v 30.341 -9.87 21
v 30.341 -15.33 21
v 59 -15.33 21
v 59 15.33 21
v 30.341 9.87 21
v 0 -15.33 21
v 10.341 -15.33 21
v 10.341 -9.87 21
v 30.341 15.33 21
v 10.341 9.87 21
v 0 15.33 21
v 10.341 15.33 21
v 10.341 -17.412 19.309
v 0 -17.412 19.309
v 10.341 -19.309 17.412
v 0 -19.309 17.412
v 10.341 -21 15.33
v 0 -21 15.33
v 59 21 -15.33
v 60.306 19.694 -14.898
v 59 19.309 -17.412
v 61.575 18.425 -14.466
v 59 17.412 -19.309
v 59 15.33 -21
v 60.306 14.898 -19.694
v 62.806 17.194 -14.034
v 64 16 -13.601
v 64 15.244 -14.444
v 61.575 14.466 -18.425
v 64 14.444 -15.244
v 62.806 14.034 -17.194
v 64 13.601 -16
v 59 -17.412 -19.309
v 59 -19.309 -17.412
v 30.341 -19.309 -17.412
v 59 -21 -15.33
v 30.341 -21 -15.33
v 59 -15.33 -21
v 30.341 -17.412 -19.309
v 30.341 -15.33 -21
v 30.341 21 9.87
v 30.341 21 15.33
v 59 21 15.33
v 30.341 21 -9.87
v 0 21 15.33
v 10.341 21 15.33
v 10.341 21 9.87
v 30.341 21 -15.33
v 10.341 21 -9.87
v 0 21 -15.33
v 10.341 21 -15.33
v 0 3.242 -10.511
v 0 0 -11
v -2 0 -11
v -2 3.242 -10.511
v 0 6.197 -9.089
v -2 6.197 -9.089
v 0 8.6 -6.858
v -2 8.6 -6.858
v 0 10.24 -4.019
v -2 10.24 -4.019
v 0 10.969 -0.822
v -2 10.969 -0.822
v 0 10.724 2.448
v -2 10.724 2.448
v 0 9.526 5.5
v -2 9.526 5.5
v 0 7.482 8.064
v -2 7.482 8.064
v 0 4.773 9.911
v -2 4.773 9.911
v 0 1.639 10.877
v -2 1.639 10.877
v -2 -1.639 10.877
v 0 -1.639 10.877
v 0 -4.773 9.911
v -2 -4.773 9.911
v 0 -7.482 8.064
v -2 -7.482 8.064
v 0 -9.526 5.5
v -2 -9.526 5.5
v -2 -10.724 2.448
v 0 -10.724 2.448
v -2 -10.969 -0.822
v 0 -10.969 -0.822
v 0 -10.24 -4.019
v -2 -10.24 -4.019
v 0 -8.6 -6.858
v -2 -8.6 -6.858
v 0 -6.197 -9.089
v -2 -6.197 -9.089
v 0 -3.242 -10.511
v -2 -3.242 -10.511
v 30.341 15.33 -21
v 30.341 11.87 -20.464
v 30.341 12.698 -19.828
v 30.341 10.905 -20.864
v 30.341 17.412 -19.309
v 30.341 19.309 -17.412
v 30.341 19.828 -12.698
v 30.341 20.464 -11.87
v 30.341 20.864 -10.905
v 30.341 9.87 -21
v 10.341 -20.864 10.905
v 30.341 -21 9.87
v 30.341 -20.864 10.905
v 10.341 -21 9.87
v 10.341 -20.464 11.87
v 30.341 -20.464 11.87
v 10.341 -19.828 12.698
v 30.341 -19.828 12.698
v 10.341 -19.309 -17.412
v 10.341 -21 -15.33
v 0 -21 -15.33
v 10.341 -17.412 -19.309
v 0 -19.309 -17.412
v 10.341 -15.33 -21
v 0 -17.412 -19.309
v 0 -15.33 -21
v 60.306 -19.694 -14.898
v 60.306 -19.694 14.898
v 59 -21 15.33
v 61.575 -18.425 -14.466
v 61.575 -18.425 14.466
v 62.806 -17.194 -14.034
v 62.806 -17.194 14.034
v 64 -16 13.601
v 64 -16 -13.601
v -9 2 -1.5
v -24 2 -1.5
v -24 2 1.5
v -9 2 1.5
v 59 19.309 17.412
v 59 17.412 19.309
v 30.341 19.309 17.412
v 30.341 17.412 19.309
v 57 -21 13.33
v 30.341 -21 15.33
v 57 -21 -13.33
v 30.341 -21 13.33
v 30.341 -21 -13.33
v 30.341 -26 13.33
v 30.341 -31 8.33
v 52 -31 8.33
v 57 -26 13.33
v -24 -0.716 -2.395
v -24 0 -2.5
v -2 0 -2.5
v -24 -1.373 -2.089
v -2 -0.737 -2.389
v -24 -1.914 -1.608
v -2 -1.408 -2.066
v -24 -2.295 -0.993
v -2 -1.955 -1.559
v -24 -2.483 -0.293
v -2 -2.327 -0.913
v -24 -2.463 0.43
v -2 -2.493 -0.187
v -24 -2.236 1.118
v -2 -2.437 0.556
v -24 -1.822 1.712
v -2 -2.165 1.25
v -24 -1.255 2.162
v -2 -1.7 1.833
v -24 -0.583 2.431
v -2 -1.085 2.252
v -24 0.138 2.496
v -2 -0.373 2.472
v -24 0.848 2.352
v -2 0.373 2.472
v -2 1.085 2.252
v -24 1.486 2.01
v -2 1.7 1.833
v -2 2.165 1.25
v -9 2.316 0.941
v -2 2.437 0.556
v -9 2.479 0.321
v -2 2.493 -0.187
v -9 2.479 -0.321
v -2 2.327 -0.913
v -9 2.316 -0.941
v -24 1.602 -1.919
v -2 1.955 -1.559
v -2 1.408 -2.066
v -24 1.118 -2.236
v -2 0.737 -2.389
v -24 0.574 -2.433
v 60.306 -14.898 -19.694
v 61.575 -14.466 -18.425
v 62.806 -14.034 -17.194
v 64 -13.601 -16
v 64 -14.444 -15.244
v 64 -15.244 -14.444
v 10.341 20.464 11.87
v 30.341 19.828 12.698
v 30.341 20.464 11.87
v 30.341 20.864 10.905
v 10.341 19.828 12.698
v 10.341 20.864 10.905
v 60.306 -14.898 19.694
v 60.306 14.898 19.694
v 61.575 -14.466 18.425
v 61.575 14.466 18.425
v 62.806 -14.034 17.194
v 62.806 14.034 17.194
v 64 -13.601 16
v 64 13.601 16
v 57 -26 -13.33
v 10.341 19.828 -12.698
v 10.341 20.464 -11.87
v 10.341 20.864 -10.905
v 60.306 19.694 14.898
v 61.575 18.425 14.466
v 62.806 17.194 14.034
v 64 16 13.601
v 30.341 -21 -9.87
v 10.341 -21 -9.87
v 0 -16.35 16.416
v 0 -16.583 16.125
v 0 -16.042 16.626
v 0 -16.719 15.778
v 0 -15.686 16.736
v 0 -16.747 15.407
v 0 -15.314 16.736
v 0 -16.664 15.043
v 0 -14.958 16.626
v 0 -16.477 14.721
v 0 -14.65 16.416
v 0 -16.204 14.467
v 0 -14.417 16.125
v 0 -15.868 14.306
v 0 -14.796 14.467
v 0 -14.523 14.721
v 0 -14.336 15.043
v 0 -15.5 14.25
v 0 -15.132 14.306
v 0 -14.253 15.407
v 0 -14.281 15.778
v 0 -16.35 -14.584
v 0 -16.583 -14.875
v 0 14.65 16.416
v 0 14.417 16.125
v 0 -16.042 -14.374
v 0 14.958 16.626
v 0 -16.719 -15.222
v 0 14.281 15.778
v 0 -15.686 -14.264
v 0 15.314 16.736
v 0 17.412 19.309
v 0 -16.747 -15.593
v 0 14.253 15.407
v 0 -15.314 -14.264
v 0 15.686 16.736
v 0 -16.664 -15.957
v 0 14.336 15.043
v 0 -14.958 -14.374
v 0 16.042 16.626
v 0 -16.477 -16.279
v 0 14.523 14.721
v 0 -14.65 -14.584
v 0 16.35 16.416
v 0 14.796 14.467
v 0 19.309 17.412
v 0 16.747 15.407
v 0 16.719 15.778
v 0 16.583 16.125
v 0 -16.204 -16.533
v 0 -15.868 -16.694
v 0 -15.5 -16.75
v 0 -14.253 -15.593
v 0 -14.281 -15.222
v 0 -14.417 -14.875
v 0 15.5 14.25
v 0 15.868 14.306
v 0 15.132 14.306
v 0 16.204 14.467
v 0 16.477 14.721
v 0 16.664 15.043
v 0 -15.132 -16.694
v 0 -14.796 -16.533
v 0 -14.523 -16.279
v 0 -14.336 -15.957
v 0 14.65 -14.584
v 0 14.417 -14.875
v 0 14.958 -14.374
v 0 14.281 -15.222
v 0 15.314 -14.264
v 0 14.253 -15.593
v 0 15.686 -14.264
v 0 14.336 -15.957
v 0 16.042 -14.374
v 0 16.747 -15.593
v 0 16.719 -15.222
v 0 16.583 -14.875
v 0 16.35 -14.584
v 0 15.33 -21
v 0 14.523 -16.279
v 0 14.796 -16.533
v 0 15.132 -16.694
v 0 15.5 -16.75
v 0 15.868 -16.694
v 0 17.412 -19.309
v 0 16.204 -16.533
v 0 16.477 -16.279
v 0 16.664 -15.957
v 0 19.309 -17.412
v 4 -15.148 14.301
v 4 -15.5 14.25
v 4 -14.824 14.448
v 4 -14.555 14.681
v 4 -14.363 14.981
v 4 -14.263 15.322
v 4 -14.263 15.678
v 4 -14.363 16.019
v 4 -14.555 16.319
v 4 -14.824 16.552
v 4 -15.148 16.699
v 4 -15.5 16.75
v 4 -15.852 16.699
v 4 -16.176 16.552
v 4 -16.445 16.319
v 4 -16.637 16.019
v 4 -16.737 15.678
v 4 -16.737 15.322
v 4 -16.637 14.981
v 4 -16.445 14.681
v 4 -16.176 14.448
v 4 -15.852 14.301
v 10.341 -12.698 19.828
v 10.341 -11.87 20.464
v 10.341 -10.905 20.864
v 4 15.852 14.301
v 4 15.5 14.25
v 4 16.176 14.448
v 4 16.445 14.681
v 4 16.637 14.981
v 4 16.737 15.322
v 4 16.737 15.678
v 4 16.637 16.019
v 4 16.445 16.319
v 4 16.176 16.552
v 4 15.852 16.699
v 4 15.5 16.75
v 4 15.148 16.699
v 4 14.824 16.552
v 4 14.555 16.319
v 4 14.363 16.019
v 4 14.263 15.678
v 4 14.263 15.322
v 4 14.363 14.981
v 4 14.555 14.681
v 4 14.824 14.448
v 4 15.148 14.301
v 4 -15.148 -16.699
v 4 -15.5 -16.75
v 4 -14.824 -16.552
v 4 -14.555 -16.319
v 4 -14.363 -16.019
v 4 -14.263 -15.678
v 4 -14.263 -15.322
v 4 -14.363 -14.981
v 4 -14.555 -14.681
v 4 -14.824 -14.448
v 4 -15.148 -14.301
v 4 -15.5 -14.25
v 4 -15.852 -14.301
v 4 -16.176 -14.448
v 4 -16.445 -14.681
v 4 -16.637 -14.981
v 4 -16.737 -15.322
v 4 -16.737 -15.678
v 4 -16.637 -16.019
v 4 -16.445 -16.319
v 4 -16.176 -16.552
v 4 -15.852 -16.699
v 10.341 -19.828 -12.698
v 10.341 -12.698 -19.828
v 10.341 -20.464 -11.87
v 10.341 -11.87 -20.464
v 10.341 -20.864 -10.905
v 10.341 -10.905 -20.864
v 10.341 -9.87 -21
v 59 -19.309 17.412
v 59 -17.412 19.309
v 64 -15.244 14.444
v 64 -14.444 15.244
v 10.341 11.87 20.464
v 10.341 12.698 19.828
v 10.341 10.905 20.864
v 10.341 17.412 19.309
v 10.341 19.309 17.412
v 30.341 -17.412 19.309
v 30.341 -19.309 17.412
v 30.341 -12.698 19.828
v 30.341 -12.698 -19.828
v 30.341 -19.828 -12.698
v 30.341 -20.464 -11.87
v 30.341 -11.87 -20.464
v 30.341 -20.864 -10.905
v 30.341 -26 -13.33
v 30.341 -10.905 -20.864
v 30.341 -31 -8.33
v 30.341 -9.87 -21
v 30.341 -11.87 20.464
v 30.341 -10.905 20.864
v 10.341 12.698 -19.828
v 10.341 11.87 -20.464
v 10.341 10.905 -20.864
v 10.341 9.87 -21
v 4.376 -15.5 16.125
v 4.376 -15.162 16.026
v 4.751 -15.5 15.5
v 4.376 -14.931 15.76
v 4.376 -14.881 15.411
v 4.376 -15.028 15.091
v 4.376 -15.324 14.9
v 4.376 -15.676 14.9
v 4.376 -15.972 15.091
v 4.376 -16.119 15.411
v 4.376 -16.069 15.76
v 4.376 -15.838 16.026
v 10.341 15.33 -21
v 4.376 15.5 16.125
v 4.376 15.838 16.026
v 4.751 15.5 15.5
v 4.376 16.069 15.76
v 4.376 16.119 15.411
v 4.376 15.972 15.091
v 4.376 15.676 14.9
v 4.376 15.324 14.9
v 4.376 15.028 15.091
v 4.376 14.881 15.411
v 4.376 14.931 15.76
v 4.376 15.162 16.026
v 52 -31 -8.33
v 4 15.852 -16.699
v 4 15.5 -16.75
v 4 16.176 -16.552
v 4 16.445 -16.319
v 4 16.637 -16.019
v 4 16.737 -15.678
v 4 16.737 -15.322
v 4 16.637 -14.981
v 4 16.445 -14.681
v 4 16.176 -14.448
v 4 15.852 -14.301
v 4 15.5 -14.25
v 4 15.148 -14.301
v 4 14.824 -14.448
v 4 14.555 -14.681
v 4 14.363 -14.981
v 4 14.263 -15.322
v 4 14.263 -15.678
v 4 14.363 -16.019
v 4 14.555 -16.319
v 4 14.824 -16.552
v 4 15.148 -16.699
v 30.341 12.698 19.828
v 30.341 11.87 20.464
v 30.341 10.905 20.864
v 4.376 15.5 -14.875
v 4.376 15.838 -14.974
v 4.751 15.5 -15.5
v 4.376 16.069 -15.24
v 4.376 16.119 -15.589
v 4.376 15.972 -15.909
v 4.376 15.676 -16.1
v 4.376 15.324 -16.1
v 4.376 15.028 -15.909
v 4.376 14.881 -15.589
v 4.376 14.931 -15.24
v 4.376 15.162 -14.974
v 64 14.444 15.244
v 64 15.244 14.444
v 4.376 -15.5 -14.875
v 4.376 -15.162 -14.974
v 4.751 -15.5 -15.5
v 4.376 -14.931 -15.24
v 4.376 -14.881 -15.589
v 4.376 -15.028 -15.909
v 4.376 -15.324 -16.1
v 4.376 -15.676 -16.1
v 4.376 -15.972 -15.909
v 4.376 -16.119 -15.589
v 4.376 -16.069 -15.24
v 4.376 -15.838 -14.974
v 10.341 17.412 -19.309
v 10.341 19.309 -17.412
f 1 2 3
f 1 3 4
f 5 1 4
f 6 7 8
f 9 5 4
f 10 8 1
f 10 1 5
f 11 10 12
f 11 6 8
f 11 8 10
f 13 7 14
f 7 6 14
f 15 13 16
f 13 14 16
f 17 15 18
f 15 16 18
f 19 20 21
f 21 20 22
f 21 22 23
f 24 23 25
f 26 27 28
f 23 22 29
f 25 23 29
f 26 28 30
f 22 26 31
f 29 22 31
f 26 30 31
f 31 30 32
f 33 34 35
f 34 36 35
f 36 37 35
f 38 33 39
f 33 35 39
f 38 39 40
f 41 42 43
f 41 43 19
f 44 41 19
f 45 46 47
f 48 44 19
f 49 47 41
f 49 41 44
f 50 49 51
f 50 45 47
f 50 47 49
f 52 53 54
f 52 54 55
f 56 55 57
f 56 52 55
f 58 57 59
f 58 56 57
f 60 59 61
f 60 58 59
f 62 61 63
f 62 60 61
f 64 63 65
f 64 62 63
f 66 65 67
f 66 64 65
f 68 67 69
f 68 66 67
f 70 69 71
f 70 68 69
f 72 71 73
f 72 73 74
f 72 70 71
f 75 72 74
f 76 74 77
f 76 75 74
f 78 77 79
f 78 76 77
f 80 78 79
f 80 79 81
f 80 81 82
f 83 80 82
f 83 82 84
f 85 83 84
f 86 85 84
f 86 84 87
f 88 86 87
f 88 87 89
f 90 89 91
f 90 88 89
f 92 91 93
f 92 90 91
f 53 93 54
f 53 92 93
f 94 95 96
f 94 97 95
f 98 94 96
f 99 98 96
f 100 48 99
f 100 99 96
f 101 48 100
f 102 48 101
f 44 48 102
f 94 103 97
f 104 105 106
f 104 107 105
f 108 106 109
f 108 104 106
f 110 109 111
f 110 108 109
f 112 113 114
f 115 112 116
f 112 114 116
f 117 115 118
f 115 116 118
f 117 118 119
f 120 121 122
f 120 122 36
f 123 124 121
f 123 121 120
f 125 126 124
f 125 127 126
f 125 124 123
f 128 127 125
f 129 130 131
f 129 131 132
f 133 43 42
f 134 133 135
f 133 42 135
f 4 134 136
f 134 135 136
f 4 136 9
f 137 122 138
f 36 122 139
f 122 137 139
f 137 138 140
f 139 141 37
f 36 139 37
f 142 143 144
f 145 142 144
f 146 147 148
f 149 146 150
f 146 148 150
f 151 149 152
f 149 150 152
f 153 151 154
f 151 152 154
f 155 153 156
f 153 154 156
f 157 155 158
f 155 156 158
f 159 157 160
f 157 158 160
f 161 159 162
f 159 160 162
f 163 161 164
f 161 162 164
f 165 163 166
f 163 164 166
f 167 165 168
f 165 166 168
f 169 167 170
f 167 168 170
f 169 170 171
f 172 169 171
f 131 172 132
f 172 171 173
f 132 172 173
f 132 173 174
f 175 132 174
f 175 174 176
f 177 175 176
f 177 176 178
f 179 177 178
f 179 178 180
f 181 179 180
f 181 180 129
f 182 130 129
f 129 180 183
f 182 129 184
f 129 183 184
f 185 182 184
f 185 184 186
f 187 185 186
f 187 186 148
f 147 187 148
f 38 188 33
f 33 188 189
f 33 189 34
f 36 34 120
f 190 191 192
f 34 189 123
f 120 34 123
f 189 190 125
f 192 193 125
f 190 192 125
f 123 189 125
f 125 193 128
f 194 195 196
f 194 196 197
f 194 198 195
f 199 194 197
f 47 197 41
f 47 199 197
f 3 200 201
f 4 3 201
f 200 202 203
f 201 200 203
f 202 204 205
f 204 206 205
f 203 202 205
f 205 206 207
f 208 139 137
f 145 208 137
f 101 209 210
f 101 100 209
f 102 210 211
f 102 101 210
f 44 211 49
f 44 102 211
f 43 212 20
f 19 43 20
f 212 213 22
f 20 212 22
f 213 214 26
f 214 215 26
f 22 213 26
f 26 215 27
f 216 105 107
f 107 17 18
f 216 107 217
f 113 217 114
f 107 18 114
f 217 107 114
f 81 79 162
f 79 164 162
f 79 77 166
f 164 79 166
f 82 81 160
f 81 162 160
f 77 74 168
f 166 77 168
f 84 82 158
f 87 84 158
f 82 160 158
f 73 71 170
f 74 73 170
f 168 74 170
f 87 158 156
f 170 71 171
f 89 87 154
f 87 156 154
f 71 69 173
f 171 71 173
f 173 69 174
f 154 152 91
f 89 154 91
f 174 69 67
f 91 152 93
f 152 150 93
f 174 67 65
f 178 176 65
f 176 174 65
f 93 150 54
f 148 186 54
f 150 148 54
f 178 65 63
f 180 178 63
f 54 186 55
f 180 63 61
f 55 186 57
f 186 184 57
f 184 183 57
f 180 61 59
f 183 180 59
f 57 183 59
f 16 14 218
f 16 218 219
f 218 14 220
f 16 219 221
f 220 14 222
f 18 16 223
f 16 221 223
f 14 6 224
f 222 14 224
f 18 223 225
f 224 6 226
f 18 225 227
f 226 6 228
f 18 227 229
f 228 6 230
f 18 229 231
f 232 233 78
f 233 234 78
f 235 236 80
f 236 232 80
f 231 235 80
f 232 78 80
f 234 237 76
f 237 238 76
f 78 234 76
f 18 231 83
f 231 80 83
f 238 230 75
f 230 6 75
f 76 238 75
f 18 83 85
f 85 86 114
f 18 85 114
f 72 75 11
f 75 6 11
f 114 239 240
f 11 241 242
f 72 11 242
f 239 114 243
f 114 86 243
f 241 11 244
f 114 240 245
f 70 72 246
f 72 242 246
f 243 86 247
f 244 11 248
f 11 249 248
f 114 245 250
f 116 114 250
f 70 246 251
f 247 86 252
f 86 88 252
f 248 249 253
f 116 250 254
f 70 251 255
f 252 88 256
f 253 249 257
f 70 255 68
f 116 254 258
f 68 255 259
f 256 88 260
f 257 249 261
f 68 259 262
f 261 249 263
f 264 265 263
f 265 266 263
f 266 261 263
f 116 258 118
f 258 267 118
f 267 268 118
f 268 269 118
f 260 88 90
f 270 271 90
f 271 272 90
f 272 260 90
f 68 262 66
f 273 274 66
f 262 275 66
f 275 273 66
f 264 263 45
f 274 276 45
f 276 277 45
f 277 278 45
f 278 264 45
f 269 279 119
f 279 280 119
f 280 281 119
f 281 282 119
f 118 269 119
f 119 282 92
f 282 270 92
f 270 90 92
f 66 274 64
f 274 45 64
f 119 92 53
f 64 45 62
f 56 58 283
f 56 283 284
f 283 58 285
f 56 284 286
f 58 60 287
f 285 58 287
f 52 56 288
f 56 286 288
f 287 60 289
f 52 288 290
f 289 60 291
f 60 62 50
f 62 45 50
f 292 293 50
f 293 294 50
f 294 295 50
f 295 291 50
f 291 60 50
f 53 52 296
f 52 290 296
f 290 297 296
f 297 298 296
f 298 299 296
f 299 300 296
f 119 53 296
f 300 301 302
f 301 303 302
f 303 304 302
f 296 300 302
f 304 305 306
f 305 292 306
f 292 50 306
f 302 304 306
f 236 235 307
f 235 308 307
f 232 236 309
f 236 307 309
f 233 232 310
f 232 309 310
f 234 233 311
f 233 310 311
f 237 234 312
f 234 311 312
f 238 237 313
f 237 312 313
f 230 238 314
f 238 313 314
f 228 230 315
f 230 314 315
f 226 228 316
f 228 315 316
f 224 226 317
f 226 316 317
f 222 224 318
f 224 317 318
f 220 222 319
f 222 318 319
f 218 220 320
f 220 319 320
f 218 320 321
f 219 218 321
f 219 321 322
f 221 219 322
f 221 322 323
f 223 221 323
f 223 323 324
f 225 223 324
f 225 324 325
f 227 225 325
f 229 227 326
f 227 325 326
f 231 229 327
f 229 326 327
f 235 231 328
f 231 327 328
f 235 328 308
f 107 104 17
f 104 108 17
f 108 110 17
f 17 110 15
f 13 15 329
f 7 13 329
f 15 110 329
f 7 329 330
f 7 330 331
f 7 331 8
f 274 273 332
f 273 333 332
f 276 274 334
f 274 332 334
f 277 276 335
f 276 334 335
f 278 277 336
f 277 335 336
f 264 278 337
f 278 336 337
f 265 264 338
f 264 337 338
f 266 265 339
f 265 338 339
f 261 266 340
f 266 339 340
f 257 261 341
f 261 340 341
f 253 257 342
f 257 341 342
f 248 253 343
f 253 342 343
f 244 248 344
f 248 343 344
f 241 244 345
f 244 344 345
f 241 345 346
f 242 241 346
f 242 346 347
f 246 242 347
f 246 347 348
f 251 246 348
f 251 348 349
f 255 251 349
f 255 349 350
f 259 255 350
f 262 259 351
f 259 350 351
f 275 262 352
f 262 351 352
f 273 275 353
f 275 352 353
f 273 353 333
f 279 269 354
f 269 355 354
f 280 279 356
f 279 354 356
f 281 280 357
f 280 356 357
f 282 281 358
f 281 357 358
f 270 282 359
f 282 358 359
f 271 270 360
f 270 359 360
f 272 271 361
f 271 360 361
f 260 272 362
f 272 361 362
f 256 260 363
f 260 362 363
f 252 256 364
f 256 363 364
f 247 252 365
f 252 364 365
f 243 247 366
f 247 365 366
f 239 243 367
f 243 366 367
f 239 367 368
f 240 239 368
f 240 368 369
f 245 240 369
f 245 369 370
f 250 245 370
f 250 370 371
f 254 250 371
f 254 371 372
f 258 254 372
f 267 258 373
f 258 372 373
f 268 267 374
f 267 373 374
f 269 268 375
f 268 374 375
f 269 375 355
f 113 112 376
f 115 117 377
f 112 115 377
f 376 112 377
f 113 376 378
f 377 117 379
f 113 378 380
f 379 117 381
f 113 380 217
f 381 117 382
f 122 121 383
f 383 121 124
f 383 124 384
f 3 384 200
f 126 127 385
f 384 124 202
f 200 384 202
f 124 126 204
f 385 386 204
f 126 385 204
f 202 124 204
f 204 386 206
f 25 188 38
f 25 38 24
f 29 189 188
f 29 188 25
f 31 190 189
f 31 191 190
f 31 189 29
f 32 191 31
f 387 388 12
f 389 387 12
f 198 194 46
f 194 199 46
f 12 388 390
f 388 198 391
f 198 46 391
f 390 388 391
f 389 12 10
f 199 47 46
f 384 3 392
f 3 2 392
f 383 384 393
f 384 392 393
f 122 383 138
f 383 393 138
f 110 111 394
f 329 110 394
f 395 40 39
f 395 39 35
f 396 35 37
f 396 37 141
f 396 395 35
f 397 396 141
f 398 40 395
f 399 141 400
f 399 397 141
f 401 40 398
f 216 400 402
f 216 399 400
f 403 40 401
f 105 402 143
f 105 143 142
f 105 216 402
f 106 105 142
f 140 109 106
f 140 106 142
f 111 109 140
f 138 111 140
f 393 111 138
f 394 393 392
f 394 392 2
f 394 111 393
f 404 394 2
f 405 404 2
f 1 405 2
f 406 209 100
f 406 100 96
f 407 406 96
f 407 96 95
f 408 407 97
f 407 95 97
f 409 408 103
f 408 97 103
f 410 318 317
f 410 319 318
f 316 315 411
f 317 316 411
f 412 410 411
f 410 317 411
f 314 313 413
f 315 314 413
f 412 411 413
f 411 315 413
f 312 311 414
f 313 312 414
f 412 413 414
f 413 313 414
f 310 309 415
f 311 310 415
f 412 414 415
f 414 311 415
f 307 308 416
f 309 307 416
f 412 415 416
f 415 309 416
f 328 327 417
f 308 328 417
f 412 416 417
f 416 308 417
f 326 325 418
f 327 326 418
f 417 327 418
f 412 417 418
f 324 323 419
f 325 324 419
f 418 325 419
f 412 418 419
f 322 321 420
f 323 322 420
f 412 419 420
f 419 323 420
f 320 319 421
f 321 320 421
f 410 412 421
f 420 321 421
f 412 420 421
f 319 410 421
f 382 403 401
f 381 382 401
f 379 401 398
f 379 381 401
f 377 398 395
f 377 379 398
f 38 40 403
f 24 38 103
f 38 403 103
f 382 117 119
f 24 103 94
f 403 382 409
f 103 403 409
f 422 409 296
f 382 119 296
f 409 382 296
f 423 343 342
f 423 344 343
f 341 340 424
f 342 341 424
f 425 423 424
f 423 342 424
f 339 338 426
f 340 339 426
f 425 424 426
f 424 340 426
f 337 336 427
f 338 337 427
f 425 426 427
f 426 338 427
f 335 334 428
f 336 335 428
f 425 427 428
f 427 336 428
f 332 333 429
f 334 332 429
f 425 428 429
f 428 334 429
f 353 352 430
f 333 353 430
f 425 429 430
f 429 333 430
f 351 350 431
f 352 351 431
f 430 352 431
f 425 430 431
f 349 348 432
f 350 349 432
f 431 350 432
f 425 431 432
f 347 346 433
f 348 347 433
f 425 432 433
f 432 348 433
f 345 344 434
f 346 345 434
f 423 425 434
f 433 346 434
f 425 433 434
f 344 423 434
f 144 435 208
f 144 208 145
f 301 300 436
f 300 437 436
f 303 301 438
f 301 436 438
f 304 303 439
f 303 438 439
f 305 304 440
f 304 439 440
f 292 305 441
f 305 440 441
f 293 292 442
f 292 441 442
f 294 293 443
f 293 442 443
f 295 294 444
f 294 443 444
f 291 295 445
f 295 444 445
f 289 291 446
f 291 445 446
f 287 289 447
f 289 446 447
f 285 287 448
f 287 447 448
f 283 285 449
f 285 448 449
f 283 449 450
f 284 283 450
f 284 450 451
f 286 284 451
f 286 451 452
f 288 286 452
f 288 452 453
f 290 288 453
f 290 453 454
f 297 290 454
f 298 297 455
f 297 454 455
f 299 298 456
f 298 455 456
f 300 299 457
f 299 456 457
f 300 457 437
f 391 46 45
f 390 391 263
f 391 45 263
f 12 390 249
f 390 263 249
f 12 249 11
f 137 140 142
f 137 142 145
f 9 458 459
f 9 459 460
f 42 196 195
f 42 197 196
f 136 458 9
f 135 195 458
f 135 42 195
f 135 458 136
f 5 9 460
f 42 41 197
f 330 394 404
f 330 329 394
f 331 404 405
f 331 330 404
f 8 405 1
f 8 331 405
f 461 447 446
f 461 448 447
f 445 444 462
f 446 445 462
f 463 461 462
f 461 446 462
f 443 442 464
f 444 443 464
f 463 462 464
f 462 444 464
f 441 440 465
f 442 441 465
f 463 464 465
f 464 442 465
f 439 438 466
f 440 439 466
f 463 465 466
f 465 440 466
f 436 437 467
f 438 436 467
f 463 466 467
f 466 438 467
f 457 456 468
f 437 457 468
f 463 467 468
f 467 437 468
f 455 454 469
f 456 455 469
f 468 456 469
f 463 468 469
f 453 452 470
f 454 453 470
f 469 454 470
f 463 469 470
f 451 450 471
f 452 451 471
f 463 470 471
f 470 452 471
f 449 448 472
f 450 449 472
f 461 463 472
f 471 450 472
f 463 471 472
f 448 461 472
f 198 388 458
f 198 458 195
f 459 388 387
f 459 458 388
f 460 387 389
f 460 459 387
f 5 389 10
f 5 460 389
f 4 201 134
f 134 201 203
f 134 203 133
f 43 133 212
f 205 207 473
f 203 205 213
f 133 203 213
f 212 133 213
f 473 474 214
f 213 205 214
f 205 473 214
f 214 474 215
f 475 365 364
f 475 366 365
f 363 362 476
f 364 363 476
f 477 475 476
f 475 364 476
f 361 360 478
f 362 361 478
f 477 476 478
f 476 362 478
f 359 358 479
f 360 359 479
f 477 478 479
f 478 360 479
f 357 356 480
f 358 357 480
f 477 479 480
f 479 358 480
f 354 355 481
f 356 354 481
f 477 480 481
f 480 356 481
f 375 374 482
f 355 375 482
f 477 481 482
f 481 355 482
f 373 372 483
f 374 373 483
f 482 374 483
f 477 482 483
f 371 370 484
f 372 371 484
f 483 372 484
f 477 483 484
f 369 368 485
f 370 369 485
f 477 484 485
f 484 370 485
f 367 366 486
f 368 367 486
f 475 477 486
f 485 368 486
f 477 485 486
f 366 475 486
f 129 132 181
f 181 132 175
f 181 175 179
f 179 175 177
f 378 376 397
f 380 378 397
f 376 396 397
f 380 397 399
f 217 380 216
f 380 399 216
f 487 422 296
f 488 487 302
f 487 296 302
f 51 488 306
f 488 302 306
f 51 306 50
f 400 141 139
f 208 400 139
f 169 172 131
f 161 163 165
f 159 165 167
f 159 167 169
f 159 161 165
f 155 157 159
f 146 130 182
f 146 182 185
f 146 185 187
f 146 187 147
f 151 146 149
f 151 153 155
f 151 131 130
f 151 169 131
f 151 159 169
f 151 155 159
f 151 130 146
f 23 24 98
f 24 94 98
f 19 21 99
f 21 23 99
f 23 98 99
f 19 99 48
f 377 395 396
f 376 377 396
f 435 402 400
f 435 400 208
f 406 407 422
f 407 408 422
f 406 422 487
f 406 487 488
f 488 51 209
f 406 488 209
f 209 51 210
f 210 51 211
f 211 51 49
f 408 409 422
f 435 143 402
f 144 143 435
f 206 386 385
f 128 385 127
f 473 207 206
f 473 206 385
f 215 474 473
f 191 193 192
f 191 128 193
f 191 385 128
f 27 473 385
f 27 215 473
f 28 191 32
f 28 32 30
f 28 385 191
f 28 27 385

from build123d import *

# Parameters (mm, degrees)
ESQUISSE1_W                  = 42
ESQUISSE1_H                  = 42
BOSS_EXTRU_1_DEPTH           = 64
ESQUISSE2_R                  = 11
BOSS_EXTRU_2_DEPTH           = 2
ESQUISSE3_R                  = 2.5
BOSS_EXTRU_3_DEPTH           = 24
TROU_TARAUD_M31_D            = 2.5
TROU_TARAUD_M31_DEPTH        = 4
TROU_TARAUD_M31_TIP          = 0.751075774
ESQUISSE6_OUTSIDE_W          = 65.234
ESQUISSE6_OUTSIDE_H          = 65.234
ESQUISSE6_OUTSIDE_R          = 26
ENL_V_MAT_EXTRU_1_DEPTH      = 71.554943129
ENL_V_MAT_EXTRU_2_DEPTH      = 71.554943129
ENL_V_MAT_EXTRU_2_DEPTH_BACK = 71.554943129
CHANFREIN1_SIZE              = 5
ESQUISSE10_W                 = 26.659419434
ESQUISSE10_H                 = 26.659419434
BOSS_EXTRU_5_DEPTH           = 10
CHANFREIN2_SIZE              = 5
ESQUISSE11_OUTSIDE_W         = 66.102
ESQUISSE11_OUTSIDE_H         = 76.102
ENL_V_MAT_EXTRU_3_DEPTH      = 20
CONG_1_R                     = 4


with BuildPart() as part:
    # Esquisse1 → Boss.-Extru.1 (new body)
    with BuildSketch(Plane(origin=(0, 0, 0), x_dir=(0, 0, -1), z_dir=(1, 0, 0))):
        Rectangle(ESQUISSE1_W, ESQUISSE1_H)
    extrude(amount=BOSS_EXTRU_1_DEPTH)

    # Esquisse2 → Boss.-Extru.2 (add)
    with BuildSketch(Plane(origin=(0, 0, 0), x_dir=(0, 0, -1), z_dir=(1, 0, 0))):
        Circle(ESQUISSE2_R)
    extrude(amount=-BOSS_EXTRU_2_DEPTH)

    # Esquisse3 → Boss.-Extru.3 (add)
    with BuildSketch(Plane.ZY):
        with Locations(Location((0, 0, 0), (0, 0, 180))):
            Circle(ESQUISSE3_R)
    extrude(amount=BOSS_EXTRU_3_DEPTH)

    # Trou taraudé M31
    with Locations(Plane.ZY):
        with Locations((-15.5, 15.5), (15.5, 15.5), (-15.5, -15.5), (15.5, -15.5)):
            Hole(TROU_TARAUD_M31_D / 2, depth=TROU_TARAUD_M31_DEPTH)
            with Locations((0, 0, -(TROU_TARAUD_M31_DEPTH + TROU_TARAUD_M31_TIP / 2))):  # 118° drill point
                Cone(0, TROU_TARAUD_M31_D / 2, TROU_TARAUD_M31_TIP, mode=Mode.SUBTRACT)

    # Esquisse6 outside → Enlèv. mat.-Extru.1 (cut, through all)
    with BuildSketch(Plane(origin=(0, 0, 0), x_dir=(0, 0, -1), z_dir=(1, 0, 0))):
        Rectangle(ESQUISSE6_OUTSIDE_W, ESQUISSE6_OUTSIDE_H)
        Circle(ESQUISSE6_OUTSIDE_R, mode=Mode.SUBTRACT)
    extrude(amount=ENL_V_MAT_EXTRU_1_DEPTH, mode=Mode.SUBTRACT)

    # Esquisse7 → Enlèv. mat.-Extru.2 (cut, two sides: drawn at the far end of the back side and taken through both)
    with BuildSketch(Plane.XY.offset(-ENL_V_MAT_EXTRU_2_DEPTH_BACK)):
        Polygon((-215.91206667, 2), (-24, 2), (-9, 2), (-9, 2.5), (-9, 194.41206667), (-270.377319091, 475.486545052), (-477.289385761, 283.074478383), align=None)
    extrude(amount=ENL_V_MAT_EXTRU_2_DEPTH + ENL_V_MAT_EXTRU_2_DEPTH_BACK, mode=Mode.SUBTRACT)

    # Chanfrein1
    chanfrein1_edges = [part.edges().sort_by_distance(p)[0] for p in [
        (64, 0, 21),
        (64, -21, 0),
        (64, 0, -21),
        (64, 21, 0),
        (64, -18.384776311, 18.384776311),
        (64, 18.384776311, 18.384776311),
        (64, -18.384776311, -18.384776311),
        (64, 18.384776311, -18.384776311),
    ]]
    chamfer(chanfrein1_edges, length=CHANFREIN1_SIZE)

    # Esquisse10 → Boss.-Extru.5 (add)
    with BuildSketch(Plane.XZ.offset(21)):
        with Locations((43.670290283, 0)):
            Rectangle(ESQUISSE10_W, ESQUISSE10_H)
    extrude(amount=BOSS_EXTRU_5_DEPTH)

    # Chanfrein2
    chanfrein2_edges = [part.edges().sort_by_distance(p)[0] for p in [
        (57, -31, 0),
        (43.670290283, -31, 13.329709717),
        (43.670290283, -31, -13.329709717),
    ]]
    chamfer(chanfrein2_edges, length=CHANFREIN2_SIZE)

    # Esquisse11 outside → Enlèv. mat.-Extru.3 (cut)
    with BuildSketch(Plane.ZY.offset(-30.340580566)):
        with Locations((0, -5)):
            Rectangle(ESQUISSE11_OUTSIDE_W, ESQUISSE11_OUTSIDE_H)
        Polygon((0, 32.526911935), (-32.526911935, 0), (0, -32.526911935), (32.526911935, 0), align=None, mode=Mode.SUBTRACT)
    extrude(amount=ENL_V_MAT_EXTRU_3_DEPTH, mode=Mode.SUBTRACT)

    # Congé1
    cong_1_edges = [part.edges().sort_by_distance(p)[0] for p in [
        (20.340580566, 21, -11.526911935),
        (20.340580566, 21, 11.526911935),
        (20.340580566, 11.526911935, 21),
        (20.340580566, 11.526911935, -21),
        (20.340580566, -21, -11.526911935),
        (20.340580566, -11.526911935, -21),
        (20.340580566, -21, 11.526911935),
        (20.340580566, -11.526911935, 21),
    ]]
    fillet(cong_1_edges, radius=CONG_1_R)


solid = part.part
